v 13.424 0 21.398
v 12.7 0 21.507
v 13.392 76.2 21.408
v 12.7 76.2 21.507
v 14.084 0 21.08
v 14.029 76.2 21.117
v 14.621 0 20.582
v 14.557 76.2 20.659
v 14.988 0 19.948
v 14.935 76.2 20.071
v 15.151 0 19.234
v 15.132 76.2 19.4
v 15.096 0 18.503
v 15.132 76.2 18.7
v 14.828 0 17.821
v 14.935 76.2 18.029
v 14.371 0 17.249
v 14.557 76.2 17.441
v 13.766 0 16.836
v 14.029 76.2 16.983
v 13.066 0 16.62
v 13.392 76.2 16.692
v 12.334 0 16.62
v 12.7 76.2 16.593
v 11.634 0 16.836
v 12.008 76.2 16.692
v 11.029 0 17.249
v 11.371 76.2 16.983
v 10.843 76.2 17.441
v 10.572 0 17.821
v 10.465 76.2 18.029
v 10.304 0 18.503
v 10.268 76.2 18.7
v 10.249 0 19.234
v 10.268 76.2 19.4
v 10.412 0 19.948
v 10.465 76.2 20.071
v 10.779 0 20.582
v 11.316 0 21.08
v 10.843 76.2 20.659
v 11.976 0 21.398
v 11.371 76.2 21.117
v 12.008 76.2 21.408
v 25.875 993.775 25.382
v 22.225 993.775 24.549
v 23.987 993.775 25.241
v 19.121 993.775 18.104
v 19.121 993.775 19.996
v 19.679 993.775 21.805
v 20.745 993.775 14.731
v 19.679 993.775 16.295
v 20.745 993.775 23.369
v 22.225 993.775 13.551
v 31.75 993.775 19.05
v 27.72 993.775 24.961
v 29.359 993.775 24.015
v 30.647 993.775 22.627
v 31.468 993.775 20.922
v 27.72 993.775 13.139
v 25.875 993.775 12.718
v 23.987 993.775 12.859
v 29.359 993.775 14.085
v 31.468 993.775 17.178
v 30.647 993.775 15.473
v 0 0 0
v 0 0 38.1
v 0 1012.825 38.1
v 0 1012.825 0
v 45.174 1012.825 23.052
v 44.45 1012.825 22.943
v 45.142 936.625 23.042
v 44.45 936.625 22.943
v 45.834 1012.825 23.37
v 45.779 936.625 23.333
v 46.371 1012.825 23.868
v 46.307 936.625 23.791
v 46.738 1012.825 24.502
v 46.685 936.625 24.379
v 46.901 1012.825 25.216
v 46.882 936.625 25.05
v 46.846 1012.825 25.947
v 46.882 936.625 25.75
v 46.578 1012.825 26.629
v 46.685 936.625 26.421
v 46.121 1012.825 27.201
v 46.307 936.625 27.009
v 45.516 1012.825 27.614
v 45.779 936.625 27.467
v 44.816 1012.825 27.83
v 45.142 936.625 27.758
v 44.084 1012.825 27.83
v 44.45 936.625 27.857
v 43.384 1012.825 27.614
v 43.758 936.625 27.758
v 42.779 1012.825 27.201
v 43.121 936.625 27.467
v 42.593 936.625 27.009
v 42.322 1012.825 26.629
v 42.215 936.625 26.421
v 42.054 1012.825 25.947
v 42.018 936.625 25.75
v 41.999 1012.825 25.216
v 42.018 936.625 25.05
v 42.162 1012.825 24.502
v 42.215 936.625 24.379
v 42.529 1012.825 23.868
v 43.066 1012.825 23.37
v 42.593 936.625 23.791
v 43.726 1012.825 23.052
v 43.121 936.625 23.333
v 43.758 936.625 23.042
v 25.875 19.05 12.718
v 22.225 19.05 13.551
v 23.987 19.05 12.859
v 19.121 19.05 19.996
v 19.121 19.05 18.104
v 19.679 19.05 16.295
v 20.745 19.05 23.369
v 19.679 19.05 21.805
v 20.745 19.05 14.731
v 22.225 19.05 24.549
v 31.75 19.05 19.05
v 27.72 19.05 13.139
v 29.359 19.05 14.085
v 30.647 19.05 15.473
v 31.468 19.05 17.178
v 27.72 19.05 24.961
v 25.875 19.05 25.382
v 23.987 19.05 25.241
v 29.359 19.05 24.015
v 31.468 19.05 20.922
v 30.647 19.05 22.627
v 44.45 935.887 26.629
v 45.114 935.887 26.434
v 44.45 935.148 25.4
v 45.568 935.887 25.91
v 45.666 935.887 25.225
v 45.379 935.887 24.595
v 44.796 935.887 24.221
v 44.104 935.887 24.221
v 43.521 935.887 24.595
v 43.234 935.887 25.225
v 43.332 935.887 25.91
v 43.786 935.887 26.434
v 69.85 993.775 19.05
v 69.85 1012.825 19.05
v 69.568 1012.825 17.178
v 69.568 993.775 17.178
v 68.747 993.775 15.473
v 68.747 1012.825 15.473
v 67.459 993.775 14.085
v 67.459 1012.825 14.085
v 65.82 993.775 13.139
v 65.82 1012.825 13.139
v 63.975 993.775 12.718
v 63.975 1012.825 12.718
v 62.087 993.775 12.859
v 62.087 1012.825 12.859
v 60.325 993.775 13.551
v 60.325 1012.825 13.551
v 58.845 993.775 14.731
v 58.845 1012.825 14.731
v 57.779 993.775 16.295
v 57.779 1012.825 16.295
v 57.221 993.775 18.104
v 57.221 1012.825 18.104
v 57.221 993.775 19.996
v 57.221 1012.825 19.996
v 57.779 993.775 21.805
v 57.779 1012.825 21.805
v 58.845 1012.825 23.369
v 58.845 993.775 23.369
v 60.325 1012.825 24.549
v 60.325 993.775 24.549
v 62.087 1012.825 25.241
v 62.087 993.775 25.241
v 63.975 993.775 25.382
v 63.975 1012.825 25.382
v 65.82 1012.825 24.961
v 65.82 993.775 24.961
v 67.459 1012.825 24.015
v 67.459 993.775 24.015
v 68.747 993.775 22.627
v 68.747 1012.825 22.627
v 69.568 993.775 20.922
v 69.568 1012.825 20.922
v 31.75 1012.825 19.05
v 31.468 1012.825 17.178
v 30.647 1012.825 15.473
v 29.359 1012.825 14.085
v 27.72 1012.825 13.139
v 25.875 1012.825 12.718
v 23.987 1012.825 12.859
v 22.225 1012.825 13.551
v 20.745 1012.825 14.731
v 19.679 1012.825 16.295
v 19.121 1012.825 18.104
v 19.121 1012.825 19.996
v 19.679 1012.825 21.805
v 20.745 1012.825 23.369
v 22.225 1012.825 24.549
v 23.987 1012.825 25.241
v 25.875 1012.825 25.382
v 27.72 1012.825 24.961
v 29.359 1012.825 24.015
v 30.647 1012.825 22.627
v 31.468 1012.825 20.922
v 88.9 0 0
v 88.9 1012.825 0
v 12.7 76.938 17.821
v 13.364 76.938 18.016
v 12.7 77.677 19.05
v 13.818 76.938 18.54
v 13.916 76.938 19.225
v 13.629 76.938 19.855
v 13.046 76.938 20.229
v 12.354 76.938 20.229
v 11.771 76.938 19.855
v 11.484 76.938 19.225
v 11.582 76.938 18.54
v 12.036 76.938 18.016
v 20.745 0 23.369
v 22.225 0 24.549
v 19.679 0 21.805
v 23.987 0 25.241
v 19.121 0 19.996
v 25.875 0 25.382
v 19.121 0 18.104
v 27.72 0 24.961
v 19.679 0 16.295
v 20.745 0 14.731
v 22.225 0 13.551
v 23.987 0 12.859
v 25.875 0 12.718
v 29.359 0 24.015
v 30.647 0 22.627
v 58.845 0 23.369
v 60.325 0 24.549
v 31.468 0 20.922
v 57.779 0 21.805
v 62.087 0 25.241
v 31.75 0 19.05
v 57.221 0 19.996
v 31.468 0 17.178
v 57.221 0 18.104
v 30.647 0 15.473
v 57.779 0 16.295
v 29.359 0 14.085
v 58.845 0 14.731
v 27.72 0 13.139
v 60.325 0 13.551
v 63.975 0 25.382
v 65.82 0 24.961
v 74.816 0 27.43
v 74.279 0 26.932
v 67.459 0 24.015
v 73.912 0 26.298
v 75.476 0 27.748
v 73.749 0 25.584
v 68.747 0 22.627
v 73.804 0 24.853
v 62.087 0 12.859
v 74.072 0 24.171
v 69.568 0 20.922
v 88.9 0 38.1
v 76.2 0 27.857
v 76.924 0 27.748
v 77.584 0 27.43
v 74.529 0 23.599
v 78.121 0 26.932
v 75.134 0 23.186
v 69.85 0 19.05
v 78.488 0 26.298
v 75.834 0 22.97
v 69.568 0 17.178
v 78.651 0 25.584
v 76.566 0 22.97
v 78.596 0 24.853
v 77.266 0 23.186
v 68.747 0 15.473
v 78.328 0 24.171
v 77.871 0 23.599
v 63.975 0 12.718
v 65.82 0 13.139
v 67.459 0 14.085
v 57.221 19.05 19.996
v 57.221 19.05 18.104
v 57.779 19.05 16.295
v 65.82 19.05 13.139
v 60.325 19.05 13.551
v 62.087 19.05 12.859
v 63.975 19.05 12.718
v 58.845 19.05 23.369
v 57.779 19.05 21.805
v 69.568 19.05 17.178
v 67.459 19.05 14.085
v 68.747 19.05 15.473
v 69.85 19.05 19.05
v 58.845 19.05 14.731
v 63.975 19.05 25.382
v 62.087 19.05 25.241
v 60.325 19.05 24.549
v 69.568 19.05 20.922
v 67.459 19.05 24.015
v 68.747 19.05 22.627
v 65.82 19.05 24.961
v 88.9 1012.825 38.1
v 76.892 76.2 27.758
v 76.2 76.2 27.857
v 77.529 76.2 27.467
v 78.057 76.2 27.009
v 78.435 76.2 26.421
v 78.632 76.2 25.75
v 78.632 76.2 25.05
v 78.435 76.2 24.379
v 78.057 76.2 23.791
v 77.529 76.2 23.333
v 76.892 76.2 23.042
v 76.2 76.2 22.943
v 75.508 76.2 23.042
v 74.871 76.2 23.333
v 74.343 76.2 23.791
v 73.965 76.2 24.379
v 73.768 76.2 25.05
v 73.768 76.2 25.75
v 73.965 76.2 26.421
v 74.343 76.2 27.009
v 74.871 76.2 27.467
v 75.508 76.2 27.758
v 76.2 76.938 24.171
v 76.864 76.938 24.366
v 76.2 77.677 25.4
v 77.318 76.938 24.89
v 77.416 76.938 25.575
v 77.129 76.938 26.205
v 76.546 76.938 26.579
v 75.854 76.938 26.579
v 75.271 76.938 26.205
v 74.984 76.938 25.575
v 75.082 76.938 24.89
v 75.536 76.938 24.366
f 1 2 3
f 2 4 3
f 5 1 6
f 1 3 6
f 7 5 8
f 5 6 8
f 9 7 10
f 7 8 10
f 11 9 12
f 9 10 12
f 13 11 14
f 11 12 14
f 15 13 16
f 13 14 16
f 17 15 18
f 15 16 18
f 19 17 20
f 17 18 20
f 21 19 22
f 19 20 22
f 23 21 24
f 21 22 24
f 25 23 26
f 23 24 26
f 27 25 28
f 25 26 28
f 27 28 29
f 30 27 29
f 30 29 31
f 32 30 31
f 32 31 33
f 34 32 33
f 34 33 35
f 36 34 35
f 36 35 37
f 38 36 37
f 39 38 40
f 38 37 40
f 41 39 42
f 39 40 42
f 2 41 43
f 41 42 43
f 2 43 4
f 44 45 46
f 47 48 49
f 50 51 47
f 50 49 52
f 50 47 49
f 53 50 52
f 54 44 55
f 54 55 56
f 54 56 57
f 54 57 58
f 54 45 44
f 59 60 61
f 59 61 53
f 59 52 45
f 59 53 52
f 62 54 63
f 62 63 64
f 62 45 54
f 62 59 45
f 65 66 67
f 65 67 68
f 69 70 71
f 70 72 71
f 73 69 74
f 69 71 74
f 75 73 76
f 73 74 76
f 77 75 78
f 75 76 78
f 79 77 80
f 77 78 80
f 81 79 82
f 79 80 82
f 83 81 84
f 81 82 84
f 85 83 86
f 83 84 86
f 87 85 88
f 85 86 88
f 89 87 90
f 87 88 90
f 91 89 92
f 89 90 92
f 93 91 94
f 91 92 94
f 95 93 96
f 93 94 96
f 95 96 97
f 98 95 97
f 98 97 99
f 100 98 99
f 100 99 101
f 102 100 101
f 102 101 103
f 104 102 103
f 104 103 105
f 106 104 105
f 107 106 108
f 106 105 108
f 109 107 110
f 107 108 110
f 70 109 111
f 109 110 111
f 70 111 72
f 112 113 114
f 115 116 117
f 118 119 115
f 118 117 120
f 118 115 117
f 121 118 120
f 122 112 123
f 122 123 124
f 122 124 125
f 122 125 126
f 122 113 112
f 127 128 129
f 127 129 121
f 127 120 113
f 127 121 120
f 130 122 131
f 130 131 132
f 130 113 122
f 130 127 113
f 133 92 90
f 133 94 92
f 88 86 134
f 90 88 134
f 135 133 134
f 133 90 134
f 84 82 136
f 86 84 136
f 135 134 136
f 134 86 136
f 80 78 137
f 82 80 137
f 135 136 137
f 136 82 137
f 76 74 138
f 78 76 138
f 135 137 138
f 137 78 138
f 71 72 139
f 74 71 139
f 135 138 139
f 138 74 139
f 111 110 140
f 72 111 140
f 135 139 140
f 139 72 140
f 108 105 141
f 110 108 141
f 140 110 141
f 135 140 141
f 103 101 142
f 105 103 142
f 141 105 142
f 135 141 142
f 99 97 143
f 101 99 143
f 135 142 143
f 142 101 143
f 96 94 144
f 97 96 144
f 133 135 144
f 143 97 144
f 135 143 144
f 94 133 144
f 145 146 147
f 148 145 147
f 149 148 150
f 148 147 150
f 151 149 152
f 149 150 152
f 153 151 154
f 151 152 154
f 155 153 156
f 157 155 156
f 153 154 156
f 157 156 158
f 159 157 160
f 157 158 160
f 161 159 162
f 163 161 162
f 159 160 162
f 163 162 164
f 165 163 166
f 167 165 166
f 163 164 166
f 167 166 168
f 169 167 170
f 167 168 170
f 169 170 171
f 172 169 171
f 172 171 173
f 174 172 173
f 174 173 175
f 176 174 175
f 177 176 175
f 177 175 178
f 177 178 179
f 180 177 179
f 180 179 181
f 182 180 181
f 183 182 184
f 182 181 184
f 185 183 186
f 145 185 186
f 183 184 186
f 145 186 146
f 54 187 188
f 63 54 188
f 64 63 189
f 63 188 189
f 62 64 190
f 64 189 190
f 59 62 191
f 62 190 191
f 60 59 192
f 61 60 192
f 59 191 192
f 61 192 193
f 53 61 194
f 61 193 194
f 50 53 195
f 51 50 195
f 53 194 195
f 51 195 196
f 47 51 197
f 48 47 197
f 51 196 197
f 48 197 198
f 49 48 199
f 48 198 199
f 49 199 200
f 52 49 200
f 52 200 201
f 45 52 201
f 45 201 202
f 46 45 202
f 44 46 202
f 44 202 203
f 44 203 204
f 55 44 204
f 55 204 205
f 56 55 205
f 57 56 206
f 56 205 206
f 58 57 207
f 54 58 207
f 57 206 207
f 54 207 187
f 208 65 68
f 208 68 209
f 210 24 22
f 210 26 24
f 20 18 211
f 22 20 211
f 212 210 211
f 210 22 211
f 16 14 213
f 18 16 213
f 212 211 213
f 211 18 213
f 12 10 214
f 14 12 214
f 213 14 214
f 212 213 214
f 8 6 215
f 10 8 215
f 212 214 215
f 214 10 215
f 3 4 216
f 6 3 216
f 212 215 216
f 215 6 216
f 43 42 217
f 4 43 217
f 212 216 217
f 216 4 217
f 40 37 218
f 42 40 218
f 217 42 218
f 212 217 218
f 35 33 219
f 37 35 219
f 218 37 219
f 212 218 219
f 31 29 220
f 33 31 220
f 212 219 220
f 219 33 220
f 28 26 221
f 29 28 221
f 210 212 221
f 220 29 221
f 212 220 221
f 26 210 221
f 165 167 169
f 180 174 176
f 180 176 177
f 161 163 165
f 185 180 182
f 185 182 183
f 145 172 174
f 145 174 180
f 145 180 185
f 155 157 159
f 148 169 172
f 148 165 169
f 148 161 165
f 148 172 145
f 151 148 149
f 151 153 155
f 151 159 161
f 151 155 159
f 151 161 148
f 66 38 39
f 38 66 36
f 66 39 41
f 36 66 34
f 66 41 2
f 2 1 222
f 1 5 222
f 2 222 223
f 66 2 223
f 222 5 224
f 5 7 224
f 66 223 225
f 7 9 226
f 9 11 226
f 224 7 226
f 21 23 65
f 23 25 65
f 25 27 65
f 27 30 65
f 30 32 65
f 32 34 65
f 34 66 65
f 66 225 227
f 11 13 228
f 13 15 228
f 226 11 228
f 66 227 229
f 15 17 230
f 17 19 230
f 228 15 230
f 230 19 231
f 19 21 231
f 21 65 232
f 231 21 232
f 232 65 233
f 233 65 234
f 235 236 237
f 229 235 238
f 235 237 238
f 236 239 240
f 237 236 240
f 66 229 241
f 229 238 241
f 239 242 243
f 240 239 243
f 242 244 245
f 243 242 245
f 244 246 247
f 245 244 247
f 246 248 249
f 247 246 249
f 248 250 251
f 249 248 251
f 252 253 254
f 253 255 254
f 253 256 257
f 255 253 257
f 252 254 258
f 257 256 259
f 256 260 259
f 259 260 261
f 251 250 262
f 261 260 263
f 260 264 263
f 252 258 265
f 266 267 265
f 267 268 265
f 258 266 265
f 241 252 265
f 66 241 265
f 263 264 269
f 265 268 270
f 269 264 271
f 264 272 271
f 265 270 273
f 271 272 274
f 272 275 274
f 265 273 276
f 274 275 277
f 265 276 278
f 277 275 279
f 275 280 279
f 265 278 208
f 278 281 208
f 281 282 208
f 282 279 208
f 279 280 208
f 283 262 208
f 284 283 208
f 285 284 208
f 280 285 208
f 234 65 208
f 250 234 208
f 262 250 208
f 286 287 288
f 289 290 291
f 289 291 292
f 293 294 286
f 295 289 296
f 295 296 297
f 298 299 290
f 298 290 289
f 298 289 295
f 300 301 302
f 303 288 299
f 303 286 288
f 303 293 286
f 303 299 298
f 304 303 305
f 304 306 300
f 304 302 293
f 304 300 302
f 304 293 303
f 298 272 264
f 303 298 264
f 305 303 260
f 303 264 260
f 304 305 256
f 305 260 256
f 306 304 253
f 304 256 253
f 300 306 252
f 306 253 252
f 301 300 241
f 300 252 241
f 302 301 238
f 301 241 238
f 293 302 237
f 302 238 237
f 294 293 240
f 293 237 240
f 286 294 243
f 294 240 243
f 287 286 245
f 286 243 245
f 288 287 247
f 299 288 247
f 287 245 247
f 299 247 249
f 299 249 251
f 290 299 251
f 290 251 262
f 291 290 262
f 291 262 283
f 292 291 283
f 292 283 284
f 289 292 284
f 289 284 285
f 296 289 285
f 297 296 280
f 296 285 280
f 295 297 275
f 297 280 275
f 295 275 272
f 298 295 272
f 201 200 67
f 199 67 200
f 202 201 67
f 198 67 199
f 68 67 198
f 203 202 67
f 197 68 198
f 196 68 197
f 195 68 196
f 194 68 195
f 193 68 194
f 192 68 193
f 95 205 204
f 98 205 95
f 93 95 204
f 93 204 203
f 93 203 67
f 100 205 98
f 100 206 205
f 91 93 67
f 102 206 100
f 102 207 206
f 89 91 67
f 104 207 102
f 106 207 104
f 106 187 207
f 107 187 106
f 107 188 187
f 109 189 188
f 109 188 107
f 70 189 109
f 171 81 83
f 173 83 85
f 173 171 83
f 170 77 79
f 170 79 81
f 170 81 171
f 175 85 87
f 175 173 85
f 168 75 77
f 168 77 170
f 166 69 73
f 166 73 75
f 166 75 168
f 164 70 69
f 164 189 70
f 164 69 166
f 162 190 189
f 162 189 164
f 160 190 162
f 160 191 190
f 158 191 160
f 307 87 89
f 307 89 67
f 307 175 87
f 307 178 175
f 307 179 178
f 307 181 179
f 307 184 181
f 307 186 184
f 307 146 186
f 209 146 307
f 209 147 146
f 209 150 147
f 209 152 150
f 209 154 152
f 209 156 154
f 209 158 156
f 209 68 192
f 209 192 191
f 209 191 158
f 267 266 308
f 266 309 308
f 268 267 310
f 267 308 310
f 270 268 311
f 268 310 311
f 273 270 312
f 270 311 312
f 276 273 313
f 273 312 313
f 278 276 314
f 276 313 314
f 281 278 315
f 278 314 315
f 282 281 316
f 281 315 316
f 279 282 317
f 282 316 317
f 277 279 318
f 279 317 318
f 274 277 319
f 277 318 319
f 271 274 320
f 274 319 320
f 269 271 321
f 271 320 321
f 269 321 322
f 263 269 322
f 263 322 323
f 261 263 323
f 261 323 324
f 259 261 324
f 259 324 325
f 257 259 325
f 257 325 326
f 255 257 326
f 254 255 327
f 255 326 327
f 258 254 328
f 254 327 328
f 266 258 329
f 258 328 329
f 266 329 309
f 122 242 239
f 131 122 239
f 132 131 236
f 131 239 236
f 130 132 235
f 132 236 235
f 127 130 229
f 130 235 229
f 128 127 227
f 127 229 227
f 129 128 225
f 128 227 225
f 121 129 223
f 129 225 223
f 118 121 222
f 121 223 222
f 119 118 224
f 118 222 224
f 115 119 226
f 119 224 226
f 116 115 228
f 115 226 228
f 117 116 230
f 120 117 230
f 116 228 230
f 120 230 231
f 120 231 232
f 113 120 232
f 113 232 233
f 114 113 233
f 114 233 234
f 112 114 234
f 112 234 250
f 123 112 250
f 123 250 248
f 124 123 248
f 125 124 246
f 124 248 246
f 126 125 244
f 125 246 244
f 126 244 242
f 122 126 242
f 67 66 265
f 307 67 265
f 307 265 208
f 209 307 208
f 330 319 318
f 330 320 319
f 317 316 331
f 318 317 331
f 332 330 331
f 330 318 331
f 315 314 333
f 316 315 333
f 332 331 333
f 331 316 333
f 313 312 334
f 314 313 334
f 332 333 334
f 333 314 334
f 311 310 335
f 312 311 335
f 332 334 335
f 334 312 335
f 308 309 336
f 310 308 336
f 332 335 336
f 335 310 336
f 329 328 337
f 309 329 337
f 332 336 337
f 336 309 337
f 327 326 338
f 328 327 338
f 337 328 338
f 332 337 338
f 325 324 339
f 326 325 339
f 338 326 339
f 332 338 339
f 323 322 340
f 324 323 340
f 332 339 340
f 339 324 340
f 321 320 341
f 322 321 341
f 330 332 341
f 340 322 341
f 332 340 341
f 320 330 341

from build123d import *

# Parameters (mm, degrees)
SKETCH1_W                                  = 88.9
SKETCH1_H                                  = 38.1
BOSS_EXTRUDE1_DEPTH                        = 1012.825
SKETCH2_R                                  = 6.35
CUT_EXTRUDE1_DEPTH                         = 19.05
SKETCH3_R                                  = 6.35
CUT_EXTRUDE2_DEPTH                         = 19.05
F_10_0_1935_DIAMETER_HOLE1_D               = 4.9149
F_10_0_1935_DIAMETER_HOLE1_DEPTH           = 76.2
F_10_0_1935_DIAMETER_HOLE1_TIP             = 1.476584928
F_10_0_1935_DIAMETER_HOLE1_ON_FACE_2_D     = 4.9149
F_10_0_1935_DIAMETER_HOLE1_ON_FACE_2_DEPTH = 76.2
F_10_0_1935_DIAMETER_HOLE1_ON_FACE_2_TIP   = 1.476584928


with BuildPart() as part:
    # Sketch1 → Boss-Extrude1 (new body)
    with BuildSketch(Plane(origin=(0, 0, 0), x_dir=(1, 0, 0), z_dir=(0, 1, 0))):
        with Locations((44.45, -19.05)):
            Rectangle(SKETCH1_W, SKETCH1_H)
    extrude(amount=BOSS_EXTRUDE1_DEPTH)

    # Sketch2 → Cut-Extrude1 (cut)
    with BuildSketch(Plane(origin=(0, 1012.825, 0), x_dir=(1, 0, 0), z_dir=(0, 1, 0))):
        with Locations((25.4, -19.05)):
            Circle(SKETCH2_R)
        with Locations((63.5, -19.05)):
            Circle(SKETCH2_R)
    extrude(amount=-CUT_EXTRUDE1_DEPTH, mode=Mode.SUBTRACT)

    # Sketch3 → Cut-Extrude2 (cut)
    with BuildSketch(Plane.XZ):
        with Locations((25.4, 19.05)):
            Circle(SKETCH3_R)
        with Locations((63.5, 19.05)):
            Circle(SKETCH3_R)
    extrude(amount=-CUT_EXTRUDE2_DEPTH, mode=Mode.SUBTRACT)

    # #10 (0.1935) Diameter Hole1
    with Locations(Plane(origin=(44.45, 1012.825, 25.4), x_dir=(0, 0, 1), z_dir=(0, 1, 0))):
        with Locations((0, 0)):
            Hole(F_10_0_1935_DIAMETER_HOLE1_D / 2, depth=F_10_0_1935_DIAMETER_HOLE1_DEPTH)
            with Locations((0, 0, -(F_10_0_1935_DIAMETER_HOLE1_DEPTH + F_10_0_1935_DIAMETER_HOLE1_TIP / 2))):  # 118° drill point
                Cone(0, F_10_0_1935_DIAMETER_HOLE1_D / 2, F_10_0_1935_DIAMETER_HOLE1_TIP, mode=Mode.SUBTRACT)

    # #10 (0.1935) Diameter Hole1 on face 2
    with Locations(Plane(origin=(12.7, 0, 19.05), x_dir=(0, 0, -1), z_dir=(0, -1, 0))):
        with Locations((0, 0), (-6.35, 63.5)):
            Hole(F_10_0_1935_DIAMETER_HOLE1_ON_FACE_2_D / 2, depth=F_10_0_1935_DIAMETER_HOLE1_ON_FACE_2_DEPTH)
            with Locations((0, 0, -(F_10_0_1935_DIAMETER_HOLE1_ON_FACE_2_DEPTH + F_10_0_1935_DIAMETER_HOLE1_ON_FACE_2_TIP / 2))):  # 118° drill point
                Cone(0, F_10_0_1935_DIAMETER_HOLE1_ON_FACE_2_D / 2, F_10_0_1935_DIAMETER_HOLE1_ON_FACE_2_TIP, mode=Mode.SUBTRACT)


solid = part.part
